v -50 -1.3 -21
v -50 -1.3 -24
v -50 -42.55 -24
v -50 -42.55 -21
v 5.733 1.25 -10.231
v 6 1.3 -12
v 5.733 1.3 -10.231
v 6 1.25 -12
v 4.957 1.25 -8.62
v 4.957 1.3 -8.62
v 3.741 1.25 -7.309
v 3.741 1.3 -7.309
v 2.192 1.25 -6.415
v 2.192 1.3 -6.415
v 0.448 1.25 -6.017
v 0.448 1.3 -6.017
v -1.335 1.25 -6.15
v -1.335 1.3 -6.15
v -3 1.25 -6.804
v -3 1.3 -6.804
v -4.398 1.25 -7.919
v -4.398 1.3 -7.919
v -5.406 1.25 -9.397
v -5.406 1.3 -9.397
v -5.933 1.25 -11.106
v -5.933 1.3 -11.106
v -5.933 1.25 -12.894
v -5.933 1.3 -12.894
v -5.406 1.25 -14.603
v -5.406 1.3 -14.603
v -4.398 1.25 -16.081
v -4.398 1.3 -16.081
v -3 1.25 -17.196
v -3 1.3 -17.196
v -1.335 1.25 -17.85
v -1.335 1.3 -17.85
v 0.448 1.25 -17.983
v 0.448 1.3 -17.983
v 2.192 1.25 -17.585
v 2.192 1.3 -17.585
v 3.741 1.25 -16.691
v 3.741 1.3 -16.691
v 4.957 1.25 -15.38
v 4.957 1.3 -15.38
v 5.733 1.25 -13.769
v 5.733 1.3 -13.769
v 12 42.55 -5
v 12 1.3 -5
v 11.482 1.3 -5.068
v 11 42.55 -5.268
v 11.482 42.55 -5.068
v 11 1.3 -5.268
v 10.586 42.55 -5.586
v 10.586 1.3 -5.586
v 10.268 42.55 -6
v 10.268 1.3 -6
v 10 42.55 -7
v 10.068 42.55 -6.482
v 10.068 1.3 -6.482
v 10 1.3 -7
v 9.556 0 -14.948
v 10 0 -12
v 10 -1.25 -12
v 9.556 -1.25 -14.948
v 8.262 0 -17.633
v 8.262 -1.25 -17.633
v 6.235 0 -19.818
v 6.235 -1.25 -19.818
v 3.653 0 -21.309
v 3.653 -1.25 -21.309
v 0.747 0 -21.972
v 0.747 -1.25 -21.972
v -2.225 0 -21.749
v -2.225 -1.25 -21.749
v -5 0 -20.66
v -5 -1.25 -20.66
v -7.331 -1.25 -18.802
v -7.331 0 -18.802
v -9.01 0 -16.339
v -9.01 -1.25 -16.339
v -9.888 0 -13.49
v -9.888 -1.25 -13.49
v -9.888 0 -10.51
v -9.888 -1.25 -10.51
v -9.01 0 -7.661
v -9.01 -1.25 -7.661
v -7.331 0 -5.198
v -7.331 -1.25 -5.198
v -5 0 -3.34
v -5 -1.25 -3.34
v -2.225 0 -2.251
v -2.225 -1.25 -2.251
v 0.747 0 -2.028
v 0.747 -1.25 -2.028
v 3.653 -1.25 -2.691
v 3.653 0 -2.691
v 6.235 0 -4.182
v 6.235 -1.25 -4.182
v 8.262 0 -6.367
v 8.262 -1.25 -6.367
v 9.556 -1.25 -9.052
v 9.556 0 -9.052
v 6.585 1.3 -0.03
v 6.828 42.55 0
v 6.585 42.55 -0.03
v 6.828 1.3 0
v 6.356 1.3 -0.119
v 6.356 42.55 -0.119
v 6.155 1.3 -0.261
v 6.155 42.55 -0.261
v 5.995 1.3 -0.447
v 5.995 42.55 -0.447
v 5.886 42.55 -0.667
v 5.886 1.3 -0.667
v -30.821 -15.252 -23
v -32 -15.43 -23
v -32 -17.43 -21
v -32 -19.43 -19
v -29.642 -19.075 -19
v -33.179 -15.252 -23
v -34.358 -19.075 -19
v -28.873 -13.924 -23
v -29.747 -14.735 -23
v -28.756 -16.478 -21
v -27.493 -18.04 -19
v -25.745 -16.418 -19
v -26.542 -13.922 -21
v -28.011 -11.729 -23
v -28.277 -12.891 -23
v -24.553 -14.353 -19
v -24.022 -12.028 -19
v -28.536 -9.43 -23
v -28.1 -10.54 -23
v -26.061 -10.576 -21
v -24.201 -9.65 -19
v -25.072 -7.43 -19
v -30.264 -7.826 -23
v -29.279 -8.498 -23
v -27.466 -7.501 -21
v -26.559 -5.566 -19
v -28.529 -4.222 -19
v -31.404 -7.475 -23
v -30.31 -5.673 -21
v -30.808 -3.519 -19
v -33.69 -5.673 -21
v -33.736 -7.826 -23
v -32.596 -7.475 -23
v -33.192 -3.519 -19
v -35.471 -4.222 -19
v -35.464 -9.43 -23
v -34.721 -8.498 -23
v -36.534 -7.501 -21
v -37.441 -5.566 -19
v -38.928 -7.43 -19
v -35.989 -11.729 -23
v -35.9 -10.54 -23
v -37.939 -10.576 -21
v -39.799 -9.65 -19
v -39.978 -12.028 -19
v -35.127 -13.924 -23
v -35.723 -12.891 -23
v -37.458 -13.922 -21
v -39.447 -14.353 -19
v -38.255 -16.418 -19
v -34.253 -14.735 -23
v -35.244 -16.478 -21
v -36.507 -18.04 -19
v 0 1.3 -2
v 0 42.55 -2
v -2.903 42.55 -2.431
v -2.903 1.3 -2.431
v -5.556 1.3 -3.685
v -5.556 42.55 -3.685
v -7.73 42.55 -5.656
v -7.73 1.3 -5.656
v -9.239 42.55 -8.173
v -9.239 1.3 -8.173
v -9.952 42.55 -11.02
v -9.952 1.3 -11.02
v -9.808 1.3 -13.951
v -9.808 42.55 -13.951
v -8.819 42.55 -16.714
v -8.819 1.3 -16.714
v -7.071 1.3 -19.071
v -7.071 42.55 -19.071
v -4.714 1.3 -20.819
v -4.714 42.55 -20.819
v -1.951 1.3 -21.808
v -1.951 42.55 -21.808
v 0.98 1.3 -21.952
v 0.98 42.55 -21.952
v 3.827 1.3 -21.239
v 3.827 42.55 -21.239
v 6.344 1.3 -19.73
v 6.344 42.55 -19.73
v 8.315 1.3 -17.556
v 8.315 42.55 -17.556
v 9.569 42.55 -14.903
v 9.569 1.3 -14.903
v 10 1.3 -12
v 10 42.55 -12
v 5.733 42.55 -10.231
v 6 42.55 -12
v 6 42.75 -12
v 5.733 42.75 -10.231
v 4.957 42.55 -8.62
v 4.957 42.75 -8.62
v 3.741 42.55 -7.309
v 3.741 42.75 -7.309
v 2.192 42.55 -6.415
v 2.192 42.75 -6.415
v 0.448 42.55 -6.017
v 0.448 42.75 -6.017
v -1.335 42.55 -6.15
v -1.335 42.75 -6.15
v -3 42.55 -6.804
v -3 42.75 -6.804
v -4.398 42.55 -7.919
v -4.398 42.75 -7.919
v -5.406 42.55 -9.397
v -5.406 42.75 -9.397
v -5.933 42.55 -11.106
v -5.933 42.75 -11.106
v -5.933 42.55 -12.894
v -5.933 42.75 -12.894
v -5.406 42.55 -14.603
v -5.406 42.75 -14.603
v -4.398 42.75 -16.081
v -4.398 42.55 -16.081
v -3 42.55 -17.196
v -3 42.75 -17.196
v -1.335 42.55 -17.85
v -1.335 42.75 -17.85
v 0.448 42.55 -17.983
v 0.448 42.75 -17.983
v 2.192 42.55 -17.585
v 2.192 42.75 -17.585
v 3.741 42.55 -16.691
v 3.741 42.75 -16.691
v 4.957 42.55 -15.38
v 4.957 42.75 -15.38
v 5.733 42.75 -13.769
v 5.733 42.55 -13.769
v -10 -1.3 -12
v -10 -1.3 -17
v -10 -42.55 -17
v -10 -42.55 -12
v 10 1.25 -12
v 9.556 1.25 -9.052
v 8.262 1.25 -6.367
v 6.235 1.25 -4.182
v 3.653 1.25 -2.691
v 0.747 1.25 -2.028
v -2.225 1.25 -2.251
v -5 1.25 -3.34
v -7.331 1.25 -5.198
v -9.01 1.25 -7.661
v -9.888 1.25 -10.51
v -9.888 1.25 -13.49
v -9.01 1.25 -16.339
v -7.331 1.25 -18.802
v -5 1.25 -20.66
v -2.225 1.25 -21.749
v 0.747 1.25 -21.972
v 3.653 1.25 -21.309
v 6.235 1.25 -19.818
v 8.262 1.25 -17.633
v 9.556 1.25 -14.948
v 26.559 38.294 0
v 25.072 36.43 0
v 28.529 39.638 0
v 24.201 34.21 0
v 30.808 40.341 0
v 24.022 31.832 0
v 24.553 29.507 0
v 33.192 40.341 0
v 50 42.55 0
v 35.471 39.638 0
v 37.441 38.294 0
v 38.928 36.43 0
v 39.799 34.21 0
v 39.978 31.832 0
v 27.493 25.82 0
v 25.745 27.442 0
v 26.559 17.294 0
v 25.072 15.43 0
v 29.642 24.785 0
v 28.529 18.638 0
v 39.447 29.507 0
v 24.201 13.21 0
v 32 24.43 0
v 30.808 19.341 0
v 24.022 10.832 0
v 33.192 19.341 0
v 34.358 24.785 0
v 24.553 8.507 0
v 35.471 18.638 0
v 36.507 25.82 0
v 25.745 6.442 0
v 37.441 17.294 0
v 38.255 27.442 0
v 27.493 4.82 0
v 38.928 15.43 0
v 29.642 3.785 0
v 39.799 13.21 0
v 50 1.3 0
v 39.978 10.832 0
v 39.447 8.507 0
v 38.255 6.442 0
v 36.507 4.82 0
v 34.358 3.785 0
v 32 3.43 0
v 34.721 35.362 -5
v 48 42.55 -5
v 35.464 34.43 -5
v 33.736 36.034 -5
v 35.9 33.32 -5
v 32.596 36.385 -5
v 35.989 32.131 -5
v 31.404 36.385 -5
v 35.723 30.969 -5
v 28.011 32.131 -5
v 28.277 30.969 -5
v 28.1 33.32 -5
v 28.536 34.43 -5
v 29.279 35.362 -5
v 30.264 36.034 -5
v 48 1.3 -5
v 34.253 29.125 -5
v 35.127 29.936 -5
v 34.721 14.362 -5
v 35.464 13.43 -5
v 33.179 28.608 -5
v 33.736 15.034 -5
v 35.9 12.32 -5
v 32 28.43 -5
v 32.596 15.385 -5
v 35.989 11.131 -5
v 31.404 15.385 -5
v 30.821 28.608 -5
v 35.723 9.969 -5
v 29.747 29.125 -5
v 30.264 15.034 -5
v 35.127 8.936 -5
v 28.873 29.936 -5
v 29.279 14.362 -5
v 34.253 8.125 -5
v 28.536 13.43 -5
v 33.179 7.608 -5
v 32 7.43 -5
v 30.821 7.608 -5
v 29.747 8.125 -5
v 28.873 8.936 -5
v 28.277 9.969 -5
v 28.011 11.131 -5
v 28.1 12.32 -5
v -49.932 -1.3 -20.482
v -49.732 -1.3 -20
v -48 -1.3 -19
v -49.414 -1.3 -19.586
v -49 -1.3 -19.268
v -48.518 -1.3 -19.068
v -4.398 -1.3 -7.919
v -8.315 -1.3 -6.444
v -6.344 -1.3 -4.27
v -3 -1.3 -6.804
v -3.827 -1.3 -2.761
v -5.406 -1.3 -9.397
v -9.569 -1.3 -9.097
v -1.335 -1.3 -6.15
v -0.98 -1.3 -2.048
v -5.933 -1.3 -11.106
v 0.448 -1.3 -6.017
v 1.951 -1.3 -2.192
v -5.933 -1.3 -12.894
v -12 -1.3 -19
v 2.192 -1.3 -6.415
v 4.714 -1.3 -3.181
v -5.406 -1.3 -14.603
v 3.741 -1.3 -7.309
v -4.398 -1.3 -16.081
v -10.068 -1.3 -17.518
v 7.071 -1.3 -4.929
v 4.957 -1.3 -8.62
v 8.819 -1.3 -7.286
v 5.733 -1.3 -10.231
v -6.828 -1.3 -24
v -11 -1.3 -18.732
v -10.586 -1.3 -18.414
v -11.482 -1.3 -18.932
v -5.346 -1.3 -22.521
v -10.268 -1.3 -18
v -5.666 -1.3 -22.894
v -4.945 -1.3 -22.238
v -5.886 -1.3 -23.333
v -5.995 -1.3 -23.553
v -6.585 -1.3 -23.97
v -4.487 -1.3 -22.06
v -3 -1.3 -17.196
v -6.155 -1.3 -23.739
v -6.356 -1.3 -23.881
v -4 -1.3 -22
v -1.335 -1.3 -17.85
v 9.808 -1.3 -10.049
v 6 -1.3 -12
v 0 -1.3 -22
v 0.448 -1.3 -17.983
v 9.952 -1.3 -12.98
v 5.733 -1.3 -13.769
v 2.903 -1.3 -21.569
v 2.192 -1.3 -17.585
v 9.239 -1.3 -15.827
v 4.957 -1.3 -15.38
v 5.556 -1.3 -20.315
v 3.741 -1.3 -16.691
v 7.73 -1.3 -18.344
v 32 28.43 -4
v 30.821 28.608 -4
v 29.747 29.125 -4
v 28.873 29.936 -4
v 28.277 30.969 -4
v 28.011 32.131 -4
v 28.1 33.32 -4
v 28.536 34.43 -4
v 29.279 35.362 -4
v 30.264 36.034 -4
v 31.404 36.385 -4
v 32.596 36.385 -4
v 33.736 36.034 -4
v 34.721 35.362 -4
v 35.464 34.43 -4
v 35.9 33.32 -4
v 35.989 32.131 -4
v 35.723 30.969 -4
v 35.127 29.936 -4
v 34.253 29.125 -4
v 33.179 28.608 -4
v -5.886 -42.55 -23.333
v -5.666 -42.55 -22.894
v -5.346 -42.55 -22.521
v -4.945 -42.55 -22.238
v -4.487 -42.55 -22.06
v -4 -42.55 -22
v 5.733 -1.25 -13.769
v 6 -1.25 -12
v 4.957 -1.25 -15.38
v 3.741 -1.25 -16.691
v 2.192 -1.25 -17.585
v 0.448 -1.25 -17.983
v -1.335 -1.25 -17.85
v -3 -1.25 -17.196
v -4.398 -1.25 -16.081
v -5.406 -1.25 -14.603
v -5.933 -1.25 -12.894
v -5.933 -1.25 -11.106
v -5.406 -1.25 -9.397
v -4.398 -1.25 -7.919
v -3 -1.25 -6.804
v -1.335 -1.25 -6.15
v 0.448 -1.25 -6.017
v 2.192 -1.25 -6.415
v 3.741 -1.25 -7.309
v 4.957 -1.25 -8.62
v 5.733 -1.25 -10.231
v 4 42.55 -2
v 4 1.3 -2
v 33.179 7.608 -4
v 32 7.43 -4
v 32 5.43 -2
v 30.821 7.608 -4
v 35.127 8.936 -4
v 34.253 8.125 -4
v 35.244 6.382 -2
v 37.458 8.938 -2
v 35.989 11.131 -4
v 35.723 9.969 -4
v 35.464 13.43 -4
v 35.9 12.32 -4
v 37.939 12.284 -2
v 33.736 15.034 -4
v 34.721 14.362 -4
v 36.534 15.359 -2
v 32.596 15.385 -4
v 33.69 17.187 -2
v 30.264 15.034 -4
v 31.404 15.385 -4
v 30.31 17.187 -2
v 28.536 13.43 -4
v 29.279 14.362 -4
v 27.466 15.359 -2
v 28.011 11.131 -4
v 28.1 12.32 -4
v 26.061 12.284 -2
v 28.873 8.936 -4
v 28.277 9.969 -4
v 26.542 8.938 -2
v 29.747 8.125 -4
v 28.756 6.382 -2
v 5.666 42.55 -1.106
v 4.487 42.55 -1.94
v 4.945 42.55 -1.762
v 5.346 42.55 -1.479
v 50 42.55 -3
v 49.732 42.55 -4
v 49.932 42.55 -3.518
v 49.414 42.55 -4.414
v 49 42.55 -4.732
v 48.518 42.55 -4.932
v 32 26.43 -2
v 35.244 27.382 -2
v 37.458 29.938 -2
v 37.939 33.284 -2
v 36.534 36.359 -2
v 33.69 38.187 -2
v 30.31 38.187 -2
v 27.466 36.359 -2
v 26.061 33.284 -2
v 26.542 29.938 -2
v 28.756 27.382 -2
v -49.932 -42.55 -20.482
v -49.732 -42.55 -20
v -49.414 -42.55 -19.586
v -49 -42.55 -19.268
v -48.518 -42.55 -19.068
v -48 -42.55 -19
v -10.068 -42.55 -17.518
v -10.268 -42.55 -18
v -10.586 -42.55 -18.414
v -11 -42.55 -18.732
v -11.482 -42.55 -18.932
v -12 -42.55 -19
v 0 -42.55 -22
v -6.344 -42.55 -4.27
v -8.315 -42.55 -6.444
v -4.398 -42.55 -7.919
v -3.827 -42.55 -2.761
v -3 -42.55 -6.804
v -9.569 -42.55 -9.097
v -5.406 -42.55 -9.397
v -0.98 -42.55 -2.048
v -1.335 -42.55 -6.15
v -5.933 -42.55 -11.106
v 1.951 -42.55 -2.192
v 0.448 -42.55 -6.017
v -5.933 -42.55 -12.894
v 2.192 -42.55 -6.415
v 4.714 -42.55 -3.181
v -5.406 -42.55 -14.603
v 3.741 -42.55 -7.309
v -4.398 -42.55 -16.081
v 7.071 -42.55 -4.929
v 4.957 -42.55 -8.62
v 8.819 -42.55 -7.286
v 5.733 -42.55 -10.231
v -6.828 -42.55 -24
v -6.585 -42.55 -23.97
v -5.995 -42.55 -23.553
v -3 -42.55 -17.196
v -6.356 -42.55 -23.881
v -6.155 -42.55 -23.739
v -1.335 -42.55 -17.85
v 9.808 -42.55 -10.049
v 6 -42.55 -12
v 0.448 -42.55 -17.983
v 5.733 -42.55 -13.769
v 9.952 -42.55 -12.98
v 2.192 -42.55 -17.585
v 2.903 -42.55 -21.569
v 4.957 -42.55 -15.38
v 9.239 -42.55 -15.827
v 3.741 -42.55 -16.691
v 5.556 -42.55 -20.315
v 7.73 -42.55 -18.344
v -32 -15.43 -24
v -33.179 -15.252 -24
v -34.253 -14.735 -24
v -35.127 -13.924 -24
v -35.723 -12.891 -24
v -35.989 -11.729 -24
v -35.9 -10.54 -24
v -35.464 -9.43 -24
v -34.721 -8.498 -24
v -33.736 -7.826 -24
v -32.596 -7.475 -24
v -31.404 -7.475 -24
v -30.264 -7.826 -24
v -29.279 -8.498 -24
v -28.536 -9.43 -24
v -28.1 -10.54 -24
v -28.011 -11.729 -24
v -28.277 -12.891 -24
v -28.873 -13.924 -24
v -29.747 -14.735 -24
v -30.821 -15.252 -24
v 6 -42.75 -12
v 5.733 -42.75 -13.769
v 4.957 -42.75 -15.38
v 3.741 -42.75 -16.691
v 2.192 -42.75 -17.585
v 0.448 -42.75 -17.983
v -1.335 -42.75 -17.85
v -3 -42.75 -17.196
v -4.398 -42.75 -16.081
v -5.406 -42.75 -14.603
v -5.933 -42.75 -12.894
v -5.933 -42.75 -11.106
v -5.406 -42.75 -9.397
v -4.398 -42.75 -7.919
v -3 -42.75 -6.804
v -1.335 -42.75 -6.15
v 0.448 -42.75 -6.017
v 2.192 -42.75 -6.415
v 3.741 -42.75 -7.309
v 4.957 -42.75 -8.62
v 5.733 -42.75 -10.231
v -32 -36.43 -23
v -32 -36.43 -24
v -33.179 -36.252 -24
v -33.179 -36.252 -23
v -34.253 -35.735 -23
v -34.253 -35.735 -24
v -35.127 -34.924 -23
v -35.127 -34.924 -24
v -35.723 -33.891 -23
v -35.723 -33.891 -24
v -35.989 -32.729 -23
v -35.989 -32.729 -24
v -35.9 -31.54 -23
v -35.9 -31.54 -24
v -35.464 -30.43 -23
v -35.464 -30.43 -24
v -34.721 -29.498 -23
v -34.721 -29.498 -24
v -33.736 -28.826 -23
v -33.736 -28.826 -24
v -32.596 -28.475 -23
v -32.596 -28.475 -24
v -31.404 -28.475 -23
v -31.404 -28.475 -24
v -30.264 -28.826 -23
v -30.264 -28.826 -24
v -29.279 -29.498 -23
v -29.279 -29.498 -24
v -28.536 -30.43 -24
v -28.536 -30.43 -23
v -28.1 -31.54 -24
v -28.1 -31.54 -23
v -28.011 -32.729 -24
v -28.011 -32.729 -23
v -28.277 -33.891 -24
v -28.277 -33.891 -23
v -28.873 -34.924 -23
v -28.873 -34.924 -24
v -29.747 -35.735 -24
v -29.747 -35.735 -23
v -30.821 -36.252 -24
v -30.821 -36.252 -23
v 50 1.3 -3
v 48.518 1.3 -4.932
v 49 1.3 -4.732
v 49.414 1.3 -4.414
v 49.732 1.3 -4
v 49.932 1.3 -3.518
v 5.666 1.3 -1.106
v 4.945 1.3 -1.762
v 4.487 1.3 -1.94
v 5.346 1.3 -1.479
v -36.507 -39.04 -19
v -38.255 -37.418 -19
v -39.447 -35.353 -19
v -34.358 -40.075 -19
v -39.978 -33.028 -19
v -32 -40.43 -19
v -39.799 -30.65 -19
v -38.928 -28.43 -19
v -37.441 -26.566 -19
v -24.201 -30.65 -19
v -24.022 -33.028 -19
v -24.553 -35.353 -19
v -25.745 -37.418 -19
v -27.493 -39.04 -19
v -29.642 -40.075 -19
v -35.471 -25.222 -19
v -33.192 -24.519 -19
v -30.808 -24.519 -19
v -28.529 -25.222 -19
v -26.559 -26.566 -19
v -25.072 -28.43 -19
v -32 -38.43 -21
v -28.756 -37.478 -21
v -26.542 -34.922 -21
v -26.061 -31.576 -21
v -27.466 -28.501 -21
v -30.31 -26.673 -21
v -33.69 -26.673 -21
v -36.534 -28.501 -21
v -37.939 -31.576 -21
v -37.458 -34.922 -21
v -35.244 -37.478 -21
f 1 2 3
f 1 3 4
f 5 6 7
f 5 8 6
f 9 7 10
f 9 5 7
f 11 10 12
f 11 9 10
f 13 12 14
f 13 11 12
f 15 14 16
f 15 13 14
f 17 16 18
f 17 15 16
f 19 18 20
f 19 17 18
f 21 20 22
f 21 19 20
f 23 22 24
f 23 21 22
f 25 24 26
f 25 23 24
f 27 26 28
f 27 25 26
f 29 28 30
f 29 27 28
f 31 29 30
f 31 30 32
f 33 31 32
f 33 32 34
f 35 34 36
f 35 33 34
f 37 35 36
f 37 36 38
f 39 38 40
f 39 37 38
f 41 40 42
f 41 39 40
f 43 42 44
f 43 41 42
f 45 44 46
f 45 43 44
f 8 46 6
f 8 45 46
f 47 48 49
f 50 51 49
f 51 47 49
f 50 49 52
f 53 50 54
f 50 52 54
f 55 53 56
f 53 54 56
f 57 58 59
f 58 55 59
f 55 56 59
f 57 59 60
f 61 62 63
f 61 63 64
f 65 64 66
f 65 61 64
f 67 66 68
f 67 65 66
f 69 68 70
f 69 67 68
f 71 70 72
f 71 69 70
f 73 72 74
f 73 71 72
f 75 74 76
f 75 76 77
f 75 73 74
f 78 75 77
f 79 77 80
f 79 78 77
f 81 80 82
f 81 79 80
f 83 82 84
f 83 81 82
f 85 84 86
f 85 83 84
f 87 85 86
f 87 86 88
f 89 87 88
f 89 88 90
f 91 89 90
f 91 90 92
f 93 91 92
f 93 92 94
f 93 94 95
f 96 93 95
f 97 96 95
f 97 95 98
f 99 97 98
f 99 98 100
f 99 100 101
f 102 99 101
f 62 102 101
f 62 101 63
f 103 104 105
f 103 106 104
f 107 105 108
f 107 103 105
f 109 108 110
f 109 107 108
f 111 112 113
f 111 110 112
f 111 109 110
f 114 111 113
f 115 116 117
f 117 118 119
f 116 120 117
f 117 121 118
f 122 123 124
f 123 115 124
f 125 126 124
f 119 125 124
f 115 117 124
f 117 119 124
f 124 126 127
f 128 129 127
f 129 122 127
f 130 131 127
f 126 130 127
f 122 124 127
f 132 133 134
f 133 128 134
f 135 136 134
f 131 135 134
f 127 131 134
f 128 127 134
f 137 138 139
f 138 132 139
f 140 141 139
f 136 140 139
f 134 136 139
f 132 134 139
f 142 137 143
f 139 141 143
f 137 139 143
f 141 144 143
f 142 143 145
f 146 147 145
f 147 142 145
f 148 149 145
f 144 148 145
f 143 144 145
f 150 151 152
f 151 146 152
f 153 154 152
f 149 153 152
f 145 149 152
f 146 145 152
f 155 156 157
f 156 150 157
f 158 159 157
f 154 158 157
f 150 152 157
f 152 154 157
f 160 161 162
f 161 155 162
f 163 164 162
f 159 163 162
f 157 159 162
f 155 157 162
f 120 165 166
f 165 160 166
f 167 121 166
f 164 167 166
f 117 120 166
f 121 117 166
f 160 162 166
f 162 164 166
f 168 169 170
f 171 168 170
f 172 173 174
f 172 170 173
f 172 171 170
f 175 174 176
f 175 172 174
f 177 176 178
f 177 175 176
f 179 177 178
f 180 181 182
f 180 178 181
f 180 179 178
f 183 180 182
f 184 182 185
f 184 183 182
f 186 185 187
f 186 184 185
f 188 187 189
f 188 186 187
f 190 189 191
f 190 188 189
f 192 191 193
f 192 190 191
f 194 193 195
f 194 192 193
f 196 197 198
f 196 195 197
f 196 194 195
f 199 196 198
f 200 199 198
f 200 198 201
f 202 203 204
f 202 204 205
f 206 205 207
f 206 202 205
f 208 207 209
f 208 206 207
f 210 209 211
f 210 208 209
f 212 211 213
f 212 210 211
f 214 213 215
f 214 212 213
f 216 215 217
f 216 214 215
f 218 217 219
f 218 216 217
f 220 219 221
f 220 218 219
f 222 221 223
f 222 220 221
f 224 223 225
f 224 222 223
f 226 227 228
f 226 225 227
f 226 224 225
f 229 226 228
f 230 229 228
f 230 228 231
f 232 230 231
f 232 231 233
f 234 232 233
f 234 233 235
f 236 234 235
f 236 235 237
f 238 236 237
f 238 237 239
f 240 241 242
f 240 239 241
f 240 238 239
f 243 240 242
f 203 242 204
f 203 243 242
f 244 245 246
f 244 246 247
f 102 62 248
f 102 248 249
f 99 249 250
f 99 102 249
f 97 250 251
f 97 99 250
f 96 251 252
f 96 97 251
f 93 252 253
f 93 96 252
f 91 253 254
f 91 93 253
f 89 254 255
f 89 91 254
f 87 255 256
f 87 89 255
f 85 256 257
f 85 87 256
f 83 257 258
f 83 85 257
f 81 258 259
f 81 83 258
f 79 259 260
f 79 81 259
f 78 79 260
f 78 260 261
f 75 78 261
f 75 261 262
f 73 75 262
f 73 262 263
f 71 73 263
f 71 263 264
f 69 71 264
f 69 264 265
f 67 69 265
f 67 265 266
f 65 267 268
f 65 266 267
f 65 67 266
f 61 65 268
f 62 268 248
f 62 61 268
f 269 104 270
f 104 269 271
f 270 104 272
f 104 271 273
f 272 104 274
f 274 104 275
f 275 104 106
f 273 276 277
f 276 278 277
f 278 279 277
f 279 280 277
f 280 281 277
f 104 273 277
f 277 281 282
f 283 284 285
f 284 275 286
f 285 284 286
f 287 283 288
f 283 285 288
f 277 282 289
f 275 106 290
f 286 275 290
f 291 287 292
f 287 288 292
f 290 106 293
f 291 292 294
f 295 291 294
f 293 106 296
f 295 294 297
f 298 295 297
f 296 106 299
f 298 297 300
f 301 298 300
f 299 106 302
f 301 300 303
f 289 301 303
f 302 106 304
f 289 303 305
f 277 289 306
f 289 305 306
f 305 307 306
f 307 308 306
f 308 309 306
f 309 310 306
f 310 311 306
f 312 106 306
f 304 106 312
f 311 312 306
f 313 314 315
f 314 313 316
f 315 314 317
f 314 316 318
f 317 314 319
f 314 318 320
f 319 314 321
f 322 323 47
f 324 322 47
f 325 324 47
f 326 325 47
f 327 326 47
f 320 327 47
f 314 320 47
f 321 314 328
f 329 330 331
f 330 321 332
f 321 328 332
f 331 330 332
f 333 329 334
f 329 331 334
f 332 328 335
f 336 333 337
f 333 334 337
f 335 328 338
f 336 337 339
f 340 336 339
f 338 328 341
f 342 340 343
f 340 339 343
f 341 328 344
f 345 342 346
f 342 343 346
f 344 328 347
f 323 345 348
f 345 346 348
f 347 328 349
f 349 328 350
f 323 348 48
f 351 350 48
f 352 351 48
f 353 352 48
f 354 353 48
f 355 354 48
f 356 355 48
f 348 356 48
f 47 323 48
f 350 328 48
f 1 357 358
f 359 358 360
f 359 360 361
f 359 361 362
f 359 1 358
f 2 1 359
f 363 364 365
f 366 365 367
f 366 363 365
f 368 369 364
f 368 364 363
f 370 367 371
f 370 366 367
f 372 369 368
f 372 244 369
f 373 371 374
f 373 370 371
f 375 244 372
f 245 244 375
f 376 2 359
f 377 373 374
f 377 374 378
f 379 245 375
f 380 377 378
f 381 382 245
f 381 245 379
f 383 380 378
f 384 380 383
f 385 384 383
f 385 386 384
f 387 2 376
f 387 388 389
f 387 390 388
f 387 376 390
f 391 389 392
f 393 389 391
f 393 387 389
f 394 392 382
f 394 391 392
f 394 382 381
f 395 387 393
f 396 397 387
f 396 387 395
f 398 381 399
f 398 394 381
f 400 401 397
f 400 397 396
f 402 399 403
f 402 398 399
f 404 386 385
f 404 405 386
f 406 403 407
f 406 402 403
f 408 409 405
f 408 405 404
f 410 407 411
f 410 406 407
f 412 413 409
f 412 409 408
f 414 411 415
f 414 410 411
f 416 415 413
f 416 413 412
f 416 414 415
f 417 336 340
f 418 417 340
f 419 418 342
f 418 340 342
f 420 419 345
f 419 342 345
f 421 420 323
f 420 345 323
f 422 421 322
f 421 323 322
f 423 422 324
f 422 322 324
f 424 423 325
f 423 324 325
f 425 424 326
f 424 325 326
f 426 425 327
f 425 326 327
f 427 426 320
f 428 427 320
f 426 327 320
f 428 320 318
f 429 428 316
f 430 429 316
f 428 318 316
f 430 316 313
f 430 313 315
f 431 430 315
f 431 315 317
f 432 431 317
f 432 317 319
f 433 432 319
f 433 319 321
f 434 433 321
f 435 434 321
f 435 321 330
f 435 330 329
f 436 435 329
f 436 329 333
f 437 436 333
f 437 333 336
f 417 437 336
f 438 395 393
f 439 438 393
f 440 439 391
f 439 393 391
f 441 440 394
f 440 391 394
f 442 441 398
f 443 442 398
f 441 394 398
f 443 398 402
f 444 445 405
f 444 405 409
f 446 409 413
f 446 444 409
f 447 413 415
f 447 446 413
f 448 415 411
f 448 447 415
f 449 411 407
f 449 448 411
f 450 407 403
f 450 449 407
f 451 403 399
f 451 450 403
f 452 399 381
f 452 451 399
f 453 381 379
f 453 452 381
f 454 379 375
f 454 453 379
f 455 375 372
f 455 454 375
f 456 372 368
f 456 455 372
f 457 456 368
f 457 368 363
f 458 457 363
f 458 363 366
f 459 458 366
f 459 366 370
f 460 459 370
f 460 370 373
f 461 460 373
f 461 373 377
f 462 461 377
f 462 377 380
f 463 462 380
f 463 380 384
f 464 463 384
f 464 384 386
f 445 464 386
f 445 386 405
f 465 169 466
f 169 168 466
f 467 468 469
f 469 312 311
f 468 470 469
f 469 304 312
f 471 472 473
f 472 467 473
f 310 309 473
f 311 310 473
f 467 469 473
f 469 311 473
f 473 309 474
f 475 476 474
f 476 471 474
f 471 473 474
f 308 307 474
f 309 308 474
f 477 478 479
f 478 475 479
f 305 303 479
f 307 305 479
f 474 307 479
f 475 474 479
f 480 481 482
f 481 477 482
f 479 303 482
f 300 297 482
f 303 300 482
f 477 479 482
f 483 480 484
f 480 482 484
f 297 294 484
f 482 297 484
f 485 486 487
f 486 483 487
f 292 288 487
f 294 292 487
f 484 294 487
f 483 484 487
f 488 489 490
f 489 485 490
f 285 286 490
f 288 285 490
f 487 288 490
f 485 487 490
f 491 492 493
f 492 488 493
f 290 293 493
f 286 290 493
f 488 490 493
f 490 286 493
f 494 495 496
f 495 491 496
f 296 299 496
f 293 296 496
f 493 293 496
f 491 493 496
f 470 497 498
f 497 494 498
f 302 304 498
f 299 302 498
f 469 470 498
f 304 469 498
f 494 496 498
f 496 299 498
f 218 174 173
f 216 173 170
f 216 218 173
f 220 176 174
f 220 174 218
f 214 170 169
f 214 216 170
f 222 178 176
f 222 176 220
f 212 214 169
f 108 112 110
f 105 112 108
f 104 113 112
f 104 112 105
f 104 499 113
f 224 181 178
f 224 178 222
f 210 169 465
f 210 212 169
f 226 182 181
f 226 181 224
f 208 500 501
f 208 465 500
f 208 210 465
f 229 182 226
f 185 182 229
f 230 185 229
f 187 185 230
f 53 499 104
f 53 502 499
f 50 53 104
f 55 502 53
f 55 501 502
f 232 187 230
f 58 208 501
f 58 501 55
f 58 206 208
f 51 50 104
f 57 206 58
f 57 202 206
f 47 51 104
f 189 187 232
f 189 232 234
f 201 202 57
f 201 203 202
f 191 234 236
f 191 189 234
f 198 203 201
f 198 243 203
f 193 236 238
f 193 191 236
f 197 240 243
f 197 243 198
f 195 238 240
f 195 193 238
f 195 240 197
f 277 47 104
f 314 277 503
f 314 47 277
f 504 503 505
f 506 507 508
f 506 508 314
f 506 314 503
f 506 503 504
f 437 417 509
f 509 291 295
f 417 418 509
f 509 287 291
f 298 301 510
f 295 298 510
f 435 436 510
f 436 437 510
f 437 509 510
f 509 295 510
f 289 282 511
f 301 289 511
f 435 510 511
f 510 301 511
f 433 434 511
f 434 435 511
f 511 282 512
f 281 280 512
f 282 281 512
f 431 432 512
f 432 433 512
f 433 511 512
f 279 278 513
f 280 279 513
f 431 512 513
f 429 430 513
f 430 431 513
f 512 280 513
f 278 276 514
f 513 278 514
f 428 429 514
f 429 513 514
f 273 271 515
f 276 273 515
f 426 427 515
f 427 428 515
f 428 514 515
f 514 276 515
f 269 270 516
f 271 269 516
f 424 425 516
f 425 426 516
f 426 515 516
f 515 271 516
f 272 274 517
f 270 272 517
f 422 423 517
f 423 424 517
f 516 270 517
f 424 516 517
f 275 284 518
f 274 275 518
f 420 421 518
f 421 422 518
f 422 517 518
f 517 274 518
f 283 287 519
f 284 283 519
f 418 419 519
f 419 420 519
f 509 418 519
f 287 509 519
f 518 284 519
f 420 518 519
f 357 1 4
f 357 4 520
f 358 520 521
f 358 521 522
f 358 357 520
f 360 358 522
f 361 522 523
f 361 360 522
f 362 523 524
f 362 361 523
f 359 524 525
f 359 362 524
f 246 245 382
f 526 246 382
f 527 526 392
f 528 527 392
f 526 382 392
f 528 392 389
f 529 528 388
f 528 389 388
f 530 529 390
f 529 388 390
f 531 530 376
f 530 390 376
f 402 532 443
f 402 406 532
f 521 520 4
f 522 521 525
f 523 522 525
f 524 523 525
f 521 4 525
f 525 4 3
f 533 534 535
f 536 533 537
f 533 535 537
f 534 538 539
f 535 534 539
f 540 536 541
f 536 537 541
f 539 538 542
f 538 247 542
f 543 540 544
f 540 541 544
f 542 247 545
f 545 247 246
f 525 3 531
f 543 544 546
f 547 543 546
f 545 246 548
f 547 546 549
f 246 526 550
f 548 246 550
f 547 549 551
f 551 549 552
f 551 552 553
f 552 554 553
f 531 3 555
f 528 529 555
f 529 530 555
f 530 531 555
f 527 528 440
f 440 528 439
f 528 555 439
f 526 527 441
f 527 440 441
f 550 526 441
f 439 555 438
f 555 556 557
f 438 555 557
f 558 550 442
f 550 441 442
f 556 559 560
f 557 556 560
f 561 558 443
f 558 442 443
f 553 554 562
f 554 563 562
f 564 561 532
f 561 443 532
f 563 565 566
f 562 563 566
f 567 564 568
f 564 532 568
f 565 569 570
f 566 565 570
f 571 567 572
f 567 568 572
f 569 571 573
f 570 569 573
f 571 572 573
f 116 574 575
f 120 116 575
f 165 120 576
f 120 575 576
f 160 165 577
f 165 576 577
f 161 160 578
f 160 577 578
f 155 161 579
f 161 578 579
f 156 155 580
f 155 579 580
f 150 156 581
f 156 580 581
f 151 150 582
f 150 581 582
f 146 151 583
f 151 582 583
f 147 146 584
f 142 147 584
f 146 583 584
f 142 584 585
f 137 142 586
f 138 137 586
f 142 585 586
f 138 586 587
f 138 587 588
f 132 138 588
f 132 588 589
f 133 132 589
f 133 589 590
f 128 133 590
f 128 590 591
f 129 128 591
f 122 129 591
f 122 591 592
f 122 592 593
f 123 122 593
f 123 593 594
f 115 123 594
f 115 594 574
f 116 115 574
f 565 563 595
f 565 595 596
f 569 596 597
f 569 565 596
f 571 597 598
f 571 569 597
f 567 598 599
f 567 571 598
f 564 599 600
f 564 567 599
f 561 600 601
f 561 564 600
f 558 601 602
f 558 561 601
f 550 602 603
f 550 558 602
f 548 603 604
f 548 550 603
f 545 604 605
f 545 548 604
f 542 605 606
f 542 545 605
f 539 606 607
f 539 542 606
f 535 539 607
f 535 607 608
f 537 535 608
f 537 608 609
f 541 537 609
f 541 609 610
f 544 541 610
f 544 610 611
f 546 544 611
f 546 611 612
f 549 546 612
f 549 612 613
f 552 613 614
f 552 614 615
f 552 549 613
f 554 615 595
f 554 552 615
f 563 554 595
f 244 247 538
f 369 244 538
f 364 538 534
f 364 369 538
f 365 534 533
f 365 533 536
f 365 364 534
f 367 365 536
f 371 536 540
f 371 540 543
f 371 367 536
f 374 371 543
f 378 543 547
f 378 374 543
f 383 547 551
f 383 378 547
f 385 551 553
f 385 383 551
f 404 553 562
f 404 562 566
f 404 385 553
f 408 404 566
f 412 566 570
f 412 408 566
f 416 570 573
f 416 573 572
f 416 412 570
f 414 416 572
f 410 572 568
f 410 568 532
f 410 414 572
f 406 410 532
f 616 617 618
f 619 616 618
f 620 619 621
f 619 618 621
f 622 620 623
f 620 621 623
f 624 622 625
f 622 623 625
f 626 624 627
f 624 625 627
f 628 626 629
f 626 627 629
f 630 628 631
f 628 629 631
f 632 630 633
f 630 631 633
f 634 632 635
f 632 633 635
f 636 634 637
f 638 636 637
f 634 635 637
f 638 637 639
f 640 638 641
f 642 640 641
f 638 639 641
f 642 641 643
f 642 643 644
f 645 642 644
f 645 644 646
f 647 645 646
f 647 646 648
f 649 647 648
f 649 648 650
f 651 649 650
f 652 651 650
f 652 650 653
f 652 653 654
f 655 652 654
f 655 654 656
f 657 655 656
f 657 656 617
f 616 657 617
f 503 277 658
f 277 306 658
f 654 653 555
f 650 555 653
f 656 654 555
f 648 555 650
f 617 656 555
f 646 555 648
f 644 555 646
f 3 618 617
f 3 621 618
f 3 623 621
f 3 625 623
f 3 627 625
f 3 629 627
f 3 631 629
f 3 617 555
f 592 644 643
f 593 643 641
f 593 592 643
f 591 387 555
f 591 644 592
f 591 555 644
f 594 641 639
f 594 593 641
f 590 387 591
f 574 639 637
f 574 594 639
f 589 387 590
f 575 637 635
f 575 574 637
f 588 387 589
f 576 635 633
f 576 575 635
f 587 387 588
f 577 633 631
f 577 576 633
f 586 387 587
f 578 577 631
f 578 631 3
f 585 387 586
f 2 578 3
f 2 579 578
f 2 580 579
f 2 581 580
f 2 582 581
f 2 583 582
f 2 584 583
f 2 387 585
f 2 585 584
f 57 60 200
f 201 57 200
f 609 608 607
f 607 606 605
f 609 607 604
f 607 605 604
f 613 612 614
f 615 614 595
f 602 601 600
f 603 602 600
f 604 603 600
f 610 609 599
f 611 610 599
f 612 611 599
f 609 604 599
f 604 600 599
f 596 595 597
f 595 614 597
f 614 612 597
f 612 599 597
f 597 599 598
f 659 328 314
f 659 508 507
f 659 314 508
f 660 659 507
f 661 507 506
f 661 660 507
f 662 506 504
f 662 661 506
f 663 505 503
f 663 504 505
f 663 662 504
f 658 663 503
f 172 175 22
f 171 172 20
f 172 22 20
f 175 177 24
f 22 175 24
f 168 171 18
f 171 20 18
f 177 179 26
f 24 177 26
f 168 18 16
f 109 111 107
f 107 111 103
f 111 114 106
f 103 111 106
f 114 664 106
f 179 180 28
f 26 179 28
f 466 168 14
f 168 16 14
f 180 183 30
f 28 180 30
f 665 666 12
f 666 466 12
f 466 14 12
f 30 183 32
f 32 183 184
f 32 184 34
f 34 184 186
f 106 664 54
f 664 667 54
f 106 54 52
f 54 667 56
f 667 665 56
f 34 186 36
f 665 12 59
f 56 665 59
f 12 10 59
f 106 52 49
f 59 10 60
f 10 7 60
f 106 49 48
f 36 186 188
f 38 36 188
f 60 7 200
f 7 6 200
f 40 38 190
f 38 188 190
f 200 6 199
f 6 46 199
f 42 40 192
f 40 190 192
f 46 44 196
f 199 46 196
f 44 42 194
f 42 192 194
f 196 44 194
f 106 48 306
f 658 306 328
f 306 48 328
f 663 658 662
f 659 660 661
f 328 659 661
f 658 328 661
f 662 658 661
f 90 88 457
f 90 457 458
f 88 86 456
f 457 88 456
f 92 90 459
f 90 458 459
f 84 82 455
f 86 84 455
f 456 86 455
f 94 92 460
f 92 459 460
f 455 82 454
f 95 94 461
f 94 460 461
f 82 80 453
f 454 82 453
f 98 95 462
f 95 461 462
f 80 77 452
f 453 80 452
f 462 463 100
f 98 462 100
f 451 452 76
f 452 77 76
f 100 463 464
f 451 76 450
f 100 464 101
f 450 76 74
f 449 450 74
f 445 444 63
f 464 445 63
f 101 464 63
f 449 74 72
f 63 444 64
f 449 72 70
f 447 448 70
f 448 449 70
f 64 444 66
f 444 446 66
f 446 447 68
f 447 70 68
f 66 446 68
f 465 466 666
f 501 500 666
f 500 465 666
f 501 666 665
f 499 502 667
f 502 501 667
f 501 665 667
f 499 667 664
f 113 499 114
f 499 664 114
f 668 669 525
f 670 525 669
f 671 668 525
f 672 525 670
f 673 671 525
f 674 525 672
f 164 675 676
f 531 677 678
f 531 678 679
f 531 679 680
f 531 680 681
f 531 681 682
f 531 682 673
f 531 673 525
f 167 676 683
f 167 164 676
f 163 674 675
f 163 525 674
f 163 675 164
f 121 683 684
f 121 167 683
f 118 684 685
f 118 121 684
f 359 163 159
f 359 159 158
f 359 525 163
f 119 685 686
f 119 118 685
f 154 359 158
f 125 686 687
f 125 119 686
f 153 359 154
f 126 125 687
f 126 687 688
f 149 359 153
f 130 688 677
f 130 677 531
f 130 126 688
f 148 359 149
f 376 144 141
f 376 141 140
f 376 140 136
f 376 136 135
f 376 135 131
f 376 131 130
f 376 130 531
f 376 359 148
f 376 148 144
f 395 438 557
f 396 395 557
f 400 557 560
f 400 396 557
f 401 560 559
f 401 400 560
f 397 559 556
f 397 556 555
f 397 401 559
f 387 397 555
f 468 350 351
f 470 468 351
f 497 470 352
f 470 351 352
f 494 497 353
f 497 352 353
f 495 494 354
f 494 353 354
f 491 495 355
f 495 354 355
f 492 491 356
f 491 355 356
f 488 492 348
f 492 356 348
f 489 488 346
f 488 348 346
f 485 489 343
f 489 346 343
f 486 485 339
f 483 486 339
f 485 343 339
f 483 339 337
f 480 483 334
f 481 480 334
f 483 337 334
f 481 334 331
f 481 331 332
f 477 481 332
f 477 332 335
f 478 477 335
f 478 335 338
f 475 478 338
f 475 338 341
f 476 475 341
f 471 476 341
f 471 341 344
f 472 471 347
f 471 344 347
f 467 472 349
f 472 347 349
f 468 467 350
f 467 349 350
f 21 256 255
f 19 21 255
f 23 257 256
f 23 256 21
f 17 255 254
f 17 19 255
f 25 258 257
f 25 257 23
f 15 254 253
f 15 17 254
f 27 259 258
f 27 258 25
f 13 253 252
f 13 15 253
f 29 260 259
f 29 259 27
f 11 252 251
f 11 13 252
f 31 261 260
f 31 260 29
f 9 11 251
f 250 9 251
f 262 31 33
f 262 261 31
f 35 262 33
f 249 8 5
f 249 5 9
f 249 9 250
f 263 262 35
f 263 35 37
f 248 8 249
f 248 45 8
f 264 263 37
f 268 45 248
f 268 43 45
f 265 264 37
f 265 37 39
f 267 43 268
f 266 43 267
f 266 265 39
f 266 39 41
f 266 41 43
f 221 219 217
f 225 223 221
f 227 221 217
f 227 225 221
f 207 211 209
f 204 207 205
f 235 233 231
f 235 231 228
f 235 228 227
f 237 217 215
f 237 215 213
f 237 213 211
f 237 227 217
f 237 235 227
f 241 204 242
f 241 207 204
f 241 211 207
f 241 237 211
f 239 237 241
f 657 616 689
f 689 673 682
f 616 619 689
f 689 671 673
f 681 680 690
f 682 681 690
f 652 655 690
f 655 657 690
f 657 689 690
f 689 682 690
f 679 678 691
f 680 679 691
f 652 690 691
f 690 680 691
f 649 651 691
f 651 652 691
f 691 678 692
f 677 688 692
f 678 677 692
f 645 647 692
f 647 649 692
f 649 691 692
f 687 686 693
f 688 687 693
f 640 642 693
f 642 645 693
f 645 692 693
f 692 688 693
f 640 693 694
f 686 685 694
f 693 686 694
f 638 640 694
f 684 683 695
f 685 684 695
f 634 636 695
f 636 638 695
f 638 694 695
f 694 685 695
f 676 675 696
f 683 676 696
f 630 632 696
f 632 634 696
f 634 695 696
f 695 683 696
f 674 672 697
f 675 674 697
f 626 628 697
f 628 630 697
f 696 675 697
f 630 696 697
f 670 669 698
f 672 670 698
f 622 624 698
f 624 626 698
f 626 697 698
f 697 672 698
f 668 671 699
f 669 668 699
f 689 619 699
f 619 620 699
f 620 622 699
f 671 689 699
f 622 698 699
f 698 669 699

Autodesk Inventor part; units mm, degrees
sketch "Skizze_34" plane through (0, 0, 0) normal (0, 1, 0) x (1, 0, 0)
  circle A0 centre (0, 12) radius 10
extrude "Extrusion1" add sketch "Skizze_34" along normal mid plane 2.5
sketch "Skizze_35" plane through (0, 0, 0) normal (0, 1, 0) x (1, 0, 0)
  circle A0 centre (0, 12) radius 6
extrude "Extrusion2" add sketch "Skizze_35" along normal mid plane 85.5
sketch "Skizze_36" plane through (0, -1.3, 0) normal (0, 1, 0) x (1, 0, 0)
  line L0 (-50, 24) -> (-50, 21)
  arc A0 (-50, 21) -> (-48, 19) centre (-48, 21) ccw
  line L1 (-48, 19) -> (-12, 19)
  arc A1 (-10, 17) -> (-12, 19) centre (-12, 17) ccw
  line L2 (-10, 17) -> (-10, 12)
  arc A2 (-10, 12) -> (0, 22) centre (0, 12) ccw
  line L3 (0, 22) -> (-4, 22)
  arc A3 (-5.8856, 23.3333) -> (-4, 22) centre (-4, 24) ccw
  arc A4 (-5.8856, 23.3333) -> (-6.8284, 24) centre (-6.8284, 23) ccw
  line L4 (-6.8284, 24) -> (-50, 24)
  circle A5 centre (0, 12) radius 6
extrude "Extrusion3" add sketch "Skizze_36" against normal blind 41.25
sketch "Skizze_37" plane through (0, 1.3, 0) normal (0, 1, 0) x (1, 0, 0)
  arc A0 (10, 12) -> (0, 2) centre (0, 12) ccw
  line L0 (0, 2) -> (4, 2)
  arc A1 (5.8856, 0.6667) -> (4, 2) centre (4, 0) ccw
  arc A2 (5.8856, 0.6667) -> (6.8284, 0) centre (6.8284, 1) ccw
  line L1 (6.8284, 0) -> (50, 0)
  line L2 (50, 0) -> (50, 3)
  arc A3 (50, 3) -> (48, 5) centre (48, 3) ccw
  line L3 (48, 5) -> (12, 5)
  arc A4 (10, 7) -> (12, 5) centre (12, 7) ccw
  line L4 (10, 7) -> (10, 12)
  circle A5 centre (0, 12) radius 6
extrude "Extrusion4" add sketch "Skizze_37" along normal blind 41.25
sketch "Sketch5" plane through (6.8284, 1.3, 0) normal (0, 0, 1) x (1, 0, 0)
  point P0 (25.1716, 10.13)
hole "Drilling 1" at (32, 11.43, 0) direction (0, 0, -1) diameter 8 depth 5 countersink diameter 16 countersink angle 90
sketch "Sketch6" plane through (6.8284, 1.3, 0) normal (0, 0, 1) x (1, 0, 0)
  point P0 (25.1716, 31.13)
hole "Drilling 2" at (32, 32.43, 0) direction (0, 0, -1) diameter 8 depth 5 countersink diameter 16 countersink angle 90
sketch "Sketch7" plane through (-48, -1.3, -19) normal (0, 0, 1) x (1, 0, 0)
  point P0 (16, -10.13)
hole "Drilling 3" at (-32, -11.43, -19) direction (0, 0, -1) diameter 8 depth 5 countersink diameter 16 countersink angle 90
sketch "Sketch8" plane through (-48, -1.3, -19) normal (0, 0, 1) x (1, 0, 0)
  point P0 (16, -31.13)
hole "Drilling 4" at (-32, -32.43, -19) direction (0, 0, -1) diameter 8 depth 5 countersink diameter 16 countersink angle 90
ref_plane "side_2a_XY" through (-32, -21.925, -19) normal (0, 0, 1) x (1, 0, 0)
ref_plane "side_2a_YZ" through (-32, -21.925, -19) normal (1, 0, 0) x (0, 1, 0)
ref_plane "side_2a_ZX" through (-32, -21.925, -19) normal (0, 1, 0) x (0, 0, 1)
ref_plane "side_2b_XY" through (-32, -21.925, -24) normal (0, 0, -1) x (1, 0, 0)
ref_plane "side_2b_YZ" through (-32, -21.925, -24) normal (1, 0, 0) x (0, -1, 0)
ref_plane "side_2b_ZX" through (-32, -21.925, -24) normal (0, -1, 0) x (0, 0, -1)
ref_plane "side_1b_XY" through (32, 21.925, -5) normal (0, 0, -1) x (-1, 0, 0)
ref_plane "side_1b_YZ" through (32, 21.925, -5) normal (-1, 0, 0) x (0, 1, 0)
ref_plane "side_1b_ZX" through (32, 21.925, -5) normal (0, 1, 0) x (0, 0, -1)
ref_plane "side_3b_XY" through (32, 21.925, -5) normal (0, 0, -1) x (-1, 0, 0)
ref_plane "side_3b_YZ" through (32, 21.925, -5) normal (-1, 0, 0) x (0, 1, 0)
ref_plane "side_3b_ZX" through (32, 21.925, -5) normal (0, 1, 0) x (0, 0, -1)
ref_plane "side_1a_XY" through (32, 21.925, 0) normal (0, 0, 1) x (-1, 0, 0)
ref_plane "side_1a_YZ" through (32, 21.925, 0) normal (-1, 0, 0) x (0, -1, 0)
ref_plane "side_1a_ZX" through (32, 21.925, 0) normal (0, -1, 0) x (0, 0, 1)
ref_plane "side_3a_XY" through (32, 21.925, 0) normal (0, 0, 1) x (-1, 0, 0)
ref_plane "side_3a_YZ" through (32, 21.925, 0) normal (-1, 0, 0) x (0, -1, 0)
ref_plane "side_3a_ZX" through (32, 21.925, 0) normal (0, -1, 0) x (0, 0, 1)
properties part number "MayTec 1.62.842032085_Alu hinges, heavy, type 20 PG 40 (180)"
